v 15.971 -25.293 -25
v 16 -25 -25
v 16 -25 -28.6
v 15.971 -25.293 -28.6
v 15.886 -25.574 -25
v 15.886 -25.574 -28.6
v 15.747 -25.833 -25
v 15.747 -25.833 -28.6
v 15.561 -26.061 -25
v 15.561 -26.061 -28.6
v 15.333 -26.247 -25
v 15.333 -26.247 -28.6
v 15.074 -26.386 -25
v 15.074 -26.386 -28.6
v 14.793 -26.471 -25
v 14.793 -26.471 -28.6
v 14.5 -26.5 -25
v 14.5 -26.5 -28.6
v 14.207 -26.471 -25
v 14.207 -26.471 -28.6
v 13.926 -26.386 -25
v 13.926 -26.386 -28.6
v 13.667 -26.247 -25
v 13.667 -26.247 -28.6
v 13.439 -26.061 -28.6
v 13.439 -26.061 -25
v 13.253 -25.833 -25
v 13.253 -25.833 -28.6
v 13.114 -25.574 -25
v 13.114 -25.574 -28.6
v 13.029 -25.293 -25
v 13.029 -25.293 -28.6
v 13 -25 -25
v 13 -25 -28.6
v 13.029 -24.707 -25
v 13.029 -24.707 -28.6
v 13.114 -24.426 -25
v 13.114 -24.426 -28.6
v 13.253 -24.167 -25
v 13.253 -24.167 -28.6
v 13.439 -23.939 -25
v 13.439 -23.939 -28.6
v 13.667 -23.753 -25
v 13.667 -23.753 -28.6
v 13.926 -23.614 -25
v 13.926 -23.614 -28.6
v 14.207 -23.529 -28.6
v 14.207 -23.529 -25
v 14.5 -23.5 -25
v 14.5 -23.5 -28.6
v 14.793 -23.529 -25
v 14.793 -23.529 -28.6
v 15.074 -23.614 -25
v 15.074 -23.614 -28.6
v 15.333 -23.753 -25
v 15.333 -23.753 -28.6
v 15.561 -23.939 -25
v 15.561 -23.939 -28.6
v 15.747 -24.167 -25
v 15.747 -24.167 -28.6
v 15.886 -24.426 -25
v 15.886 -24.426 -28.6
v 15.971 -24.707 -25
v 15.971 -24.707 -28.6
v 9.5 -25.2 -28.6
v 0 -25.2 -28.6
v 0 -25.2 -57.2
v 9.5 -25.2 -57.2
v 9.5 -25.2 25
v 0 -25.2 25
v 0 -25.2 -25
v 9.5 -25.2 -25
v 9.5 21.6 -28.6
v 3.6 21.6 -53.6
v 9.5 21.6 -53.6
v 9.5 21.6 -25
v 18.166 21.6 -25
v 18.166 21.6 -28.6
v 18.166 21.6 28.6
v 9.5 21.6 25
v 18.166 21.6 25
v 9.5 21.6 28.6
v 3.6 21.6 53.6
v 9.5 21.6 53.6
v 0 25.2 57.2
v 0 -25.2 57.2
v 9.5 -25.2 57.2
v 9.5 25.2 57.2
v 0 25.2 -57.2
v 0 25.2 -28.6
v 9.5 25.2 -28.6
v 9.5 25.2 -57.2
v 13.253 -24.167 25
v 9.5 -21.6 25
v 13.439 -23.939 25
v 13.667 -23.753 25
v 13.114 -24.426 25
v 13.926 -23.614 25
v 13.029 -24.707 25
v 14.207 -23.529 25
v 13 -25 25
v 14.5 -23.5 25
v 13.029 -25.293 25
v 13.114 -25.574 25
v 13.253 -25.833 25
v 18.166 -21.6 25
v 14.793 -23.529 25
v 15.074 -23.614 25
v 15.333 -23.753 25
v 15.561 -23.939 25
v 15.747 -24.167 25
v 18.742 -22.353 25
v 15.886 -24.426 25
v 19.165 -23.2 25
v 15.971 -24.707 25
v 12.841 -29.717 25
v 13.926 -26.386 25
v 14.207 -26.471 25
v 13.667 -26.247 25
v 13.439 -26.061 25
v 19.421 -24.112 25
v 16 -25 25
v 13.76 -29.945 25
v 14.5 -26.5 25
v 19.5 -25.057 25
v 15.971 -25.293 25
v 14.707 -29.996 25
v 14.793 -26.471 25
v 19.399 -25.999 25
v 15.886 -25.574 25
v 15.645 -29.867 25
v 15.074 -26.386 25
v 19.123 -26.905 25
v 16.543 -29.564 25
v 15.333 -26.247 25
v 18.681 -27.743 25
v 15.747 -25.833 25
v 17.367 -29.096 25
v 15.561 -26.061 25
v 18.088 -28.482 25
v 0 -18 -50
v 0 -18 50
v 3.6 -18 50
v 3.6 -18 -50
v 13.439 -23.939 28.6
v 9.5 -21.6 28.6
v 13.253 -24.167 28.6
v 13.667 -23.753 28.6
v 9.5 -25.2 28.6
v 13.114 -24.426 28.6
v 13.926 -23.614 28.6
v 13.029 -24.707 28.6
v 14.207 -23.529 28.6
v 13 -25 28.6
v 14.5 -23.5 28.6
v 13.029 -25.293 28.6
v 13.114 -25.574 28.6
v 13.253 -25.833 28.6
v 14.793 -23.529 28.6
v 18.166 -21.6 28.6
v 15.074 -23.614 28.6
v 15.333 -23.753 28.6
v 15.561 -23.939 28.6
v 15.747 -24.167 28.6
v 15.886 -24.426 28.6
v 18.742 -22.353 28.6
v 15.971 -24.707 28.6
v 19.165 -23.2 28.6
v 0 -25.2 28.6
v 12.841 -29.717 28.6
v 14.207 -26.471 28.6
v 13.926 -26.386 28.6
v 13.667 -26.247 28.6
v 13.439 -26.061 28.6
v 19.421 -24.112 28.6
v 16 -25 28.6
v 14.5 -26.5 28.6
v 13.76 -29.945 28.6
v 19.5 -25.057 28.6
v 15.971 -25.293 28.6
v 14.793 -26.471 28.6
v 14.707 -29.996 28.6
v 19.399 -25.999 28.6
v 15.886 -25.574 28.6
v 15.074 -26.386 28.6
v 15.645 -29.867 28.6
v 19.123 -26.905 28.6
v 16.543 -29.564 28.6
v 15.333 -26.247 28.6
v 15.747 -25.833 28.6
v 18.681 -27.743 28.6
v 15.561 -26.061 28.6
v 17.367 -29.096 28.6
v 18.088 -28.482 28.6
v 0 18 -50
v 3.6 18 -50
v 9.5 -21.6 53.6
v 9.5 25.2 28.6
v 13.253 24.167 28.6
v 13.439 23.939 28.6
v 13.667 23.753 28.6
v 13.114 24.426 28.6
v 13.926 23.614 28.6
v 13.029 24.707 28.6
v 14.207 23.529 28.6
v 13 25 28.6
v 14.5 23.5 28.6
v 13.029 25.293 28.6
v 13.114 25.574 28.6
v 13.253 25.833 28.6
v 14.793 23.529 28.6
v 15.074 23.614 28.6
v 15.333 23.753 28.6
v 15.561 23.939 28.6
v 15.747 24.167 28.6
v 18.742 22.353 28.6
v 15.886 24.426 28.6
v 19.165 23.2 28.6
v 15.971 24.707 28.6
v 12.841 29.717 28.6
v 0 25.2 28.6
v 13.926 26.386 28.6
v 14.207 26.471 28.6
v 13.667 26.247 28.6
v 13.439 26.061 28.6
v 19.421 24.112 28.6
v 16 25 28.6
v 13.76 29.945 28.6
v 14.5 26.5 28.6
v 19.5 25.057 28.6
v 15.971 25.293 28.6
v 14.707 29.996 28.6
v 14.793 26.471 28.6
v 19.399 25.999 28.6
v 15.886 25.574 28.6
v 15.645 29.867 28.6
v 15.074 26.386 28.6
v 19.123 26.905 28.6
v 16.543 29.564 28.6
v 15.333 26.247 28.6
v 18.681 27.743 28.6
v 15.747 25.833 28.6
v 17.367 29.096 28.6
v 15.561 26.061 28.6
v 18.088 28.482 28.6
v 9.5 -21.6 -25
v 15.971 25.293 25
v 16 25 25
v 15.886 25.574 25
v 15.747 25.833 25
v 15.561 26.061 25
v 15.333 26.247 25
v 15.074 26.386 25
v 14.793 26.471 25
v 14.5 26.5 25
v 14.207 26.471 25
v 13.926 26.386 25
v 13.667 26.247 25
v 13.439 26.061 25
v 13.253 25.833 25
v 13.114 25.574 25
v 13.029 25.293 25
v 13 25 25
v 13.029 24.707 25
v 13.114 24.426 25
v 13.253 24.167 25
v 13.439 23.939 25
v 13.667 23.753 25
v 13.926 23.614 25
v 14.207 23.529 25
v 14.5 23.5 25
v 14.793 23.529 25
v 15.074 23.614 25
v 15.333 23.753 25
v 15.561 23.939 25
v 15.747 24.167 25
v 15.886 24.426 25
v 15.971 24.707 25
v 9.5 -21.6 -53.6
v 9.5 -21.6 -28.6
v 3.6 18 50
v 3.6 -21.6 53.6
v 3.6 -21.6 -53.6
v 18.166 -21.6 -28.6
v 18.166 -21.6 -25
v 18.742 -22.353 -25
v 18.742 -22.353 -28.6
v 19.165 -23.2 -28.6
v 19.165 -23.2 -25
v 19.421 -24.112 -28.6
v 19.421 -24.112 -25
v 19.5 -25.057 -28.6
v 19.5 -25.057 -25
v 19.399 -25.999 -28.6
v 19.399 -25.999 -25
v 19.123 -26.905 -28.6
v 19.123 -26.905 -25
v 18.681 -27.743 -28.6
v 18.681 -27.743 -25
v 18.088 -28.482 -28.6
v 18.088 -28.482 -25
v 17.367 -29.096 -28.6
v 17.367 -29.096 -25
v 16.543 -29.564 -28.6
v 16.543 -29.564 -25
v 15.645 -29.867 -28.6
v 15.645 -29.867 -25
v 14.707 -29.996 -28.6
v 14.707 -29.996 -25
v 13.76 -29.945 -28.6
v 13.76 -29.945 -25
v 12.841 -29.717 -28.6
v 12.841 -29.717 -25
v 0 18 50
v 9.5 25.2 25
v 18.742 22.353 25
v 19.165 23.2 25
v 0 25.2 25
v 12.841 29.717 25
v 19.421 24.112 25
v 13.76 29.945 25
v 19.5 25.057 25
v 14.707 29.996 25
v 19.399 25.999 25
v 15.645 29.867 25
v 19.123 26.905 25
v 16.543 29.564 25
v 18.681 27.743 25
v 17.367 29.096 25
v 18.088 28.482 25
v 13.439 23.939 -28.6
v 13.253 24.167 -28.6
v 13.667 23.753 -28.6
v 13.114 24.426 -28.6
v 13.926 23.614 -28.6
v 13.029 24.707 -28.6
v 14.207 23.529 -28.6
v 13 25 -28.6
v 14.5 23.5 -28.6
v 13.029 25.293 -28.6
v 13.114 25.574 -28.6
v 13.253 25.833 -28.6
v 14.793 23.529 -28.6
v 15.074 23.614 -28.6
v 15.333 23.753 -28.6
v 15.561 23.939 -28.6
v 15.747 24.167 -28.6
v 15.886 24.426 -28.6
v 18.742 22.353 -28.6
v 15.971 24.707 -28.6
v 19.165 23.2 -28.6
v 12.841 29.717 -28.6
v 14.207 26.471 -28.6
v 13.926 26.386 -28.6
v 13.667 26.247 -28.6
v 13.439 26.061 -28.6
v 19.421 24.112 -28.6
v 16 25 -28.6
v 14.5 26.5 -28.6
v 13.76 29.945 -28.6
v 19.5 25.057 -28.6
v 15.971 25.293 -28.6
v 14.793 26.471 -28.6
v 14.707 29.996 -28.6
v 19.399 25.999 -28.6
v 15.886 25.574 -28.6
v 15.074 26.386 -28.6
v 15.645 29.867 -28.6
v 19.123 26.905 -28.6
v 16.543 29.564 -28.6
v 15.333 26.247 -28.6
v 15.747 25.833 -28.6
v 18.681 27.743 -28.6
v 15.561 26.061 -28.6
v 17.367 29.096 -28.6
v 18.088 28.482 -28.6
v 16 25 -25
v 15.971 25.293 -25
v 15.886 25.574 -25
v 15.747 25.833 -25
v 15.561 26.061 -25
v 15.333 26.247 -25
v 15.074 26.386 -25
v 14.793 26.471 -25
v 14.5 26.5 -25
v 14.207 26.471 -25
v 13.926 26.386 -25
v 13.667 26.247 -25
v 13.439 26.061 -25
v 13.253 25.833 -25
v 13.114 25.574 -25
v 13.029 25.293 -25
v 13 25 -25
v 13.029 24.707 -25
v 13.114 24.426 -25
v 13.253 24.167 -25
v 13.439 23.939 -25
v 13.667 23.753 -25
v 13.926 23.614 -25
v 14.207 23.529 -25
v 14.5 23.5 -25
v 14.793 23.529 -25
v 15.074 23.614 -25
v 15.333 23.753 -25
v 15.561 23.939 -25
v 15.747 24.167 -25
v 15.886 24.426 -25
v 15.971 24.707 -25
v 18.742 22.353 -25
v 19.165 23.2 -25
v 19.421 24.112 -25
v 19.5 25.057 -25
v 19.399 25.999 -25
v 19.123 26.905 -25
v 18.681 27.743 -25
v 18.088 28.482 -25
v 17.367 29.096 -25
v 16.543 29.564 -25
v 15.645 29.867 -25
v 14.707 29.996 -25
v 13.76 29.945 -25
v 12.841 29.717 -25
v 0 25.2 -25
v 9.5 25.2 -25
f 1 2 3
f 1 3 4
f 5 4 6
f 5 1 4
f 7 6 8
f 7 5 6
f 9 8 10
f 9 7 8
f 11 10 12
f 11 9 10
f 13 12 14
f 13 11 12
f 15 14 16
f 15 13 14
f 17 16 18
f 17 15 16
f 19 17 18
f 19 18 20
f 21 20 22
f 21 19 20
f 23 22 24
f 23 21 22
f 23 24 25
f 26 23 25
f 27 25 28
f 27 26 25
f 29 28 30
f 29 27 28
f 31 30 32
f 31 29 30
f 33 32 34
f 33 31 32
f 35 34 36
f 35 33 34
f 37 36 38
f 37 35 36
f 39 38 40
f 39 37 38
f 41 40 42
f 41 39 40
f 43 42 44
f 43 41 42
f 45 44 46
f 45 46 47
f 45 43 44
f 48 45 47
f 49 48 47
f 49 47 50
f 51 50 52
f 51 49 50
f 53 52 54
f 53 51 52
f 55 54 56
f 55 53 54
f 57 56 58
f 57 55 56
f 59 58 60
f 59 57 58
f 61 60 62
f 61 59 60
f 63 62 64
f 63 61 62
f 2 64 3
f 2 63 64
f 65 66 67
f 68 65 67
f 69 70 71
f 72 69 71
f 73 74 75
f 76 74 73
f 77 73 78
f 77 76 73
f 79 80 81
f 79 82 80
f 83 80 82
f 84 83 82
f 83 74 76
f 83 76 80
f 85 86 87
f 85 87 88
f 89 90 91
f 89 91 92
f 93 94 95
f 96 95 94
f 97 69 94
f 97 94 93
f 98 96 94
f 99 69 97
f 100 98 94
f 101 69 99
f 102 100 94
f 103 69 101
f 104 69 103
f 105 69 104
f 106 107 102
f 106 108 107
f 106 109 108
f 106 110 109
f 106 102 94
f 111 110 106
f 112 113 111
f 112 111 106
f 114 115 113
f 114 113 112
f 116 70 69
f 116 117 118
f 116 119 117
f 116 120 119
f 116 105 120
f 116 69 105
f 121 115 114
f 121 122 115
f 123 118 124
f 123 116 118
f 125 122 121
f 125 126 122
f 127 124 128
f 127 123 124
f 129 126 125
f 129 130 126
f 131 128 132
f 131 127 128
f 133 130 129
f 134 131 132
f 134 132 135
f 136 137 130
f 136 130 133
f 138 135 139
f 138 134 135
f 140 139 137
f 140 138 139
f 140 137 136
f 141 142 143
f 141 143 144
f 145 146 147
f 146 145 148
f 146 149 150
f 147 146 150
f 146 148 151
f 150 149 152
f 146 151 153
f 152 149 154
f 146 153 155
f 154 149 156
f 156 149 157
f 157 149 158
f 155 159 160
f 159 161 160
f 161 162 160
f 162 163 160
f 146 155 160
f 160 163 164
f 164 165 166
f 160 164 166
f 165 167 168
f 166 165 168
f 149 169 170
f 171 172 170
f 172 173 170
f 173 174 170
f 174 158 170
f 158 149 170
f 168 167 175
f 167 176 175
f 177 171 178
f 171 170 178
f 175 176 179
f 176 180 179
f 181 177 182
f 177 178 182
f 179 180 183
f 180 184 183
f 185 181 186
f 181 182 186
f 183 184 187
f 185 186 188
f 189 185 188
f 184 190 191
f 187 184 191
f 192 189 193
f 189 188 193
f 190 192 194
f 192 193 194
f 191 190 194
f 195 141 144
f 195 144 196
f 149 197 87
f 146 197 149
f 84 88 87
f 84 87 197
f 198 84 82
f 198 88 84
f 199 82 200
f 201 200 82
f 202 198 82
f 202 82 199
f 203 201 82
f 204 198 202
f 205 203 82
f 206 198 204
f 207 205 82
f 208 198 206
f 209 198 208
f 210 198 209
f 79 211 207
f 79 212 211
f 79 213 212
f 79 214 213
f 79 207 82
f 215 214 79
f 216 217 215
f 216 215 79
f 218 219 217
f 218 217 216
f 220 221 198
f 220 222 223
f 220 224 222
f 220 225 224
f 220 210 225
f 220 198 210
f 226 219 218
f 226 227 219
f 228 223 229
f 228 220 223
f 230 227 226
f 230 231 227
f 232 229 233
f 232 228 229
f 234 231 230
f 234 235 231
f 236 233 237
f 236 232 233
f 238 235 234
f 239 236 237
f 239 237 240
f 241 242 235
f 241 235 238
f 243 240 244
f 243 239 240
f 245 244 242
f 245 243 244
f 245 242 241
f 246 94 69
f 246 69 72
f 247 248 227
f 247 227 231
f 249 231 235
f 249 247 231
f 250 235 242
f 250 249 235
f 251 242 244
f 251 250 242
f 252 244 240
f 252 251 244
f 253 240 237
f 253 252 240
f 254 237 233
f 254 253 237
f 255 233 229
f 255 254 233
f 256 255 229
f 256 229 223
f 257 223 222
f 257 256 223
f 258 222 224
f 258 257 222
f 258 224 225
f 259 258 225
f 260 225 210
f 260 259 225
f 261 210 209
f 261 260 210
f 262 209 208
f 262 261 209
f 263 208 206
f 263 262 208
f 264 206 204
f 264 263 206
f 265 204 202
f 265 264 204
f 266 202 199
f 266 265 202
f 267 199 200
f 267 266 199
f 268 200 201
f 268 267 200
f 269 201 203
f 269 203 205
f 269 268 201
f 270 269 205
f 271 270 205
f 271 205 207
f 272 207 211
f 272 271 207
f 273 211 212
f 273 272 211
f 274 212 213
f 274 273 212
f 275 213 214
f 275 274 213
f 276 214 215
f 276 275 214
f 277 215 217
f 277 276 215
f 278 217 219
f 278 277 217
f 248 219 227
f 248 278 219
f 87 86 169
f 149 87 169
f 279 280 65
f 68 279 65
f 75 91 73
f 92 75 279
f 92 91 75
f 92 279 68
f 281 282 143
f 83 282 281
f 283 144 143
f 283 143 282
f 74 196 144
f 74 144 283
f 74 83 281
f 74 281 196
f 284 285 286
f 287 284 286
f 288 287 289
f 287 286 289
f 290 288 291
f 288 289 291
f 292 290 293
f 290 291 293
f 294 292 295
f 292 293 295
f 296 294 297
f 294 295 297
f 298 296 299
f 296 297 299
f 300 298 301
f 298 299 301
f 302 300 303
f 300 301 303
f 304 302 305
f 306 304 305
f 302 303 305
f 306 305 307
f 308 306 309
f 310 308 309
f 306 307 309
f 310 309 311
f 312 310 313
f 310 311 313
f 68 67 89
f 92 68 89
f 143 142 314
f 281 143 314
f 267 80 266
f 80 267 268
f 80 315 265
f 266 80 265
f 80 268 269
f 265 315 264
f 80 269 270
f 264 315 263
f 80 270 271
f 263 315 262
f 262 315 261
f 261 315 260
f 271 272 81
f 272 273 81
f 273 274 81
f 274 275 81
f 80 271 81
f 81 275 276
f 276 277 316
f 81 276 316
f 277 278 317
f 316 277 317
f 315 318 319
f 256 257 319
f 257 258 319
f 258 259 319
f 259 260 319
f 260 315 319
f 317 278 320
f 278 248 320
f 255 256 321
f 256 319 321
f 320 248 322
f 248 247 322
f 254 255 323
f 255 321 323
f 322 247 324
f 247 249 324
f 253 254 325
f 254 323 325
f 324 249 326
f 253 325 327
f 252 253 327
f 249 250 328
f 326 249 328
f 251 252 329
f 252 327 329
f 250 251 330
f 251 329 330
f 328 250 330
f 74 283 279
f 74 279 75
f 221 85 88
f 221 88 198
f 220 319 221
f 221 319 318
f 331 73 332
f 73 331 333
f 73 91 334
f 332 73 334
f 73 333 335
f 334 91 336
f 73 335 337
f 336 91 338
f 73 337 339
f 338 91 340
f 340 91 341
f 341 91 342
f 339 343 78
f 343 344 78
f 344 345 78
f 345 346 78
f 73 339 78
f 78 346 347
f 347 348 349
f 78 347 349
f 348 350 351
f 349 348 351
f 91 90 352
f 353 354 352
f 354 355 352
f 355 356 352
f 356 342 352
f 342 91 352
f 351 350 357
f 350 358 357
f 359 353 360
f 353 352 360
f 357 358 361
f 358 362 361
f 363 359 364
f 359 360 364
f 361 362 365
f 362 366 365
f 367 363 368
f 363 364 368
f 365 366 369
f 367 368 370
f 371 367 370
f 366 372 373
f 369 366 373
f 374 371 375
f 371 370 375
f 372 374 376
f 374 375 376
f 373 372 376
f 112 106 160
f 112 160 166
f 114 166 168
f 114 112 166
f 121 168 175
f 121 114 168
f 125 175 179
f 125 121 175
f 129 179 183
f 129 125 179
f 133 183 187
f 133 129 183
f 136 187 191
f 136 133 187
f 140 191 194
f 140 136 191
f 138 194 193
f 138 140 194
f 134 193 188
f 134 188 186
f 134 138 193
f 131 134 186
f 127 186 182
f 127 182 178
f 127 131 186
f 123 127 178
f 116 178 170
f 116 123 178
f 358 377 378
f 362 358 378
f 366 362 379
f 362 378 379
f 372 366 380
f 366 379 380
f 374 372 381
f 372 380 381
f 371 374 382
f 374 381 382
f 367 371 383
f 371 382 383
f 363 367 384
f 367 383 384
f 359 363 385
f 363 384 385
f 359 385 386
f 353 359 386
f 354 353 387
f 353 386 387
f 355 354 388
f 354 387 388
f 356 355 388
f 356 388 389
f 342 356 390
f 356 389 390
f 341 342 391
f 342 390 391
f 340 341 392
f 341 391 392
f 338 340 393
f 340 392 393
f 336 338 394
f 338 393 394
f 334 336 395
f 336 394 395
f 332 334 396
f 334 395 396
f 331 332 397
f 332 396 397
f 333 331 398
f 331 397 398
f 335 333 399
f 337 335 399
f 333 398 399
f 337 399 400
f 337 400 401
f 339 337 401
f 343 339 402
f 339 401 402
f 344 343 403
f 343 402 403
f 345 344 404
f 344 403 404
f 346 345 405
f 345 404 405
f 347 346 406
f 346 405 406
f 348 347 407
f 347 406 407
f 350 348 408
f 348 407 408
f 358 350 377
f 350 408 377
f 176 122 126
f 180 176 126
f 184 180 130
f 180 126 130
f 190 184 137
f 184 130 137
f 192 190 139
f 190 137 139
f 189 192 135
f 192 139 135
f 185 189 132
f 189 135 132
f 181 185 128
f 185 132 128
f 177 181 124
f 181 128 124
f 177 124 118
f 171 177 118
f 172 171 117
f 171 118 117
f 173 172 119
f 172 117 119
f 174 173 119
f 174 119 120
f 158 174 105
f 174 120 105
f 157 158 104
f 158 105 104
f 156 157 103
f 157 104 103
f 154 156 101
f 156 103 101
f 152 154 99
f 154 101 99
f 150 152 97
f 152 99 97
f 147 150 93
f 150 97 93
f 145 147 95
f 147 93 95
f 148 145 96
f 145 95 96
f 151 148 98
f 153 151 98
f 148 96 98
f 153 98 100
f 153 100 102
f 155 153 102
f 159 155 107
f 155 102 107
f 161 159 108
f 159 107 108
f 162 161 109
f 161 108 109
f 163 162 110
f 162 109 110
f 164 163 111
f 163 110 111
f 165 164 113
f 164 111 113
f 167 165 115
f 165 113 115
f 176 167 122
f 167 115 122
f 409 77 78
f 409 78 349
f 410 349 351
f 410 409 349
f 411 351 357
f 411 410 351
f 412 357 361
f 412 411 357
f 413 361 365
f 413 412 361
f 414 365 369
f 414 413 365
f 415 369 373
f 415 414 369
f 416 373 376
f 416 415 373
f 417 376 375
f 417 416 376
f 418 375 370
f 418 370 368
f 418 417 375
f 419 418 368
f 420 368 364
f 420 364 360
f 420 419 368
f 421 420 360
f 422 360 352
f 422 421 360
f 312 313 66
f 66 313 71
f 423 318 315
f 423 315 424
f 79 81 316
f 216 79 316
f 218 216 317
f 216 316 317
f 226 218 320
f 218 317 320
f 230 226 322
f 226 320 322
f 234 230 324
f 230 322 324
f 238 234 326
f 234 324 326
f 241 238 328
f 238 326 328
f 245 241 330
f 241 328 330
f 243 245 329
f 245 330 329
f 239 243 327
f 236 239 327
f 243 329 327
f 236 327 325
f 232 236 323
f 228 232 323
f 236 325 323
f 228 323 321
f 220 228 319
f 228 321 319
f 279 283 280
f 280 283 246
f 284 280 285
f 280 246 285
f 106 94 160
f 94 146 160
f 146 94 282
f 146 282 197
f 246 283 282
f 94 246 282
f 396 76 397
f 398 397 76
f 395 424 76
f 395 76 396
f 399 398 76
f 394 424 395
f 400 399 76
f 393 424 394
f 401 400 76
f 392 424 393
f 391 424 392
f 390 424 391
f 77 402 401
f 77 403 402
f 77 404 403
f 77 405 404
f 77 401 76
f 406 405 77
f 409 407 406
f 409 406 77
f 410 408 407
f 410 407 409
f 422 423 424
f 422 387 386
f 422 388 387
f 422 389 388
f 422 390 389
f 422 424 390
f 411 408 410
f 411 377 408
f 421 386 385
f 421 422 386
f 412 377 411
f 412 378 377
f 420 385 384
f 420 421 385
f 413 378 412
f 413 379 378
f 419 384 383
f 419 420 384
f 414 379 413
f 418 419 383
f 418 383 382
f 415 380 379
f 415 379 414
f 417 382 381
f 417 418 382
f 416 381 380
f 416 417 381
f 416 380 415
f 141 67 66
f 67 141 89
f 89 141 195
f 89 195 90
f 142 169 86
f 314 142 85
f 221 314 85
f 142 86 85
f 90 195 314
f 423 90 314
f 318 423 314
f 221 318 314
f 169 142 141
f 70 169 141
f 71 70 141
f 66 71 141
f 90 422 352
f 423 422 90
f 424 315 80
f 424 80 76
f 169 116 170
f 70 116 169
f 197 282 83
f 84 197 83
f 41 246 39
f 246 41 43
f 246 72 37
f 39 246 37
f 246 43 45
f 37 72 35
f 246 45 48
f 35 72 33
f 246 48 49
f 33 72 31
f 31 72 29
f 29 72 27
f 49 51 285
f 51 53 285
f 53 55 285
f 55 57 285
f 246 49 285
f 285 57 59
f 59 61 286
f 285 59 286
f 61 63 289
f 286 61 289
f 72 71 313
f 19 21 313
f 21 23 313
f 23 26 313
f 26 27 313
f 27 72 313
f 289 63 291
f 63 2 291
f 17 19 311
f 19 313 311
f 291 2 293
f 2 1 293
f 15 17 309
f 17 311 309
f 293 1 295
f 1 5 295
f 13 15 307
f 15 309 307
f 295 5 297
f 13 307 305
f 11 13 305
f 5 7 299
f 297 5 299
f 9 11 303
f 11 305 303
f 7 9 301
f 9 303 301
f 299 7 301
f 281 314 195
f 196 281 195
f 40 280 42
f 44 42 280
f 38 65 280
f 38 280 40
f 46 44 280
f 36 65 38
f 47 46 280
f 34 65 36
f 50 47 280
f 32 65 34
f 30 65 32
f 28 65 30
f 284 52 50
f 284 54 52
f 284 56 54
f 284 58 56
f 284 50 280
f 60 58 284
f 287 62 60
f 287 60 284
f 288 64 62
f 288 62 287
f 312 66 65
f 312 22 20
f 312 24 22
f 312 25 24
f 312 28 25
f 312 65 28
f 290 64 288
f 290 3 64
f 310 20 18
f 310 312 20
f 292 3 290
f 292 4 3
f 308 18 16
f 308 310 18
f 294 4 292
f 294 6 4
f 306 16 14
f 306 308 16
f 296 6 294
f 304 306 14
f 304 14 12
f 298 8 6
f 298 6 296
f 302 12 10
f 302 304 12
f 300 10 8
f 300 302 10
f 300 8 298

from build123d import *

# Parameters (mm, degrees)
SKETCH_1_W               = 114.4
SKETCH_1_H               = 50.4
SKETCH_1_W_2             = 100
SKETCH_1_H_2             = 36
EXTRUDE_1_DEPTH          = 3.6
SKETCH_1_3_W             = 114.4
SKETCH_1_3_H             = 50.4
SKETCH_1_3_W_2           = 107.2
SKETCH_1_3_H_2           = 43.2
EXTRUDE_2_DEPTH          = 9.5
EXTRUDE_START            = 25
SKETCH_2_R               = 1.5
EXTRUDE_3_DEPTH          = 3.6
MIRROR_START             = 25
MIRROR_2_COPY_1_SKETCH_R = 1.5
MIRROR_2_COPY_1_DEPTH    = 3.6


with BuildPart() as part:
    # 草图1 → 凸台-拉伸1 (new body)
    with BuildSketch(Plane(origin=(0, 0, 0), x_dir=(0, 0, -1), z_dir=(1, 0, 0))):
        Rectangle(SKETCH_1_W, SKETCH_1_H)
        Rectangle(SKETCH_1_W_2, SKETCH_1_H_2, mode=Mode.SUBTRACT)
    extrude(amount=EXTRUDE_1_DEPTH)

    # 草图1<3> → 凸台-拉伸2 (add)
    with BuildSketch(Plane(origin=(0, 0, 0), x_dir=(0, 0, -1), z_dir=(1, 0, 0))):
        Rectangle(SKETCH_1_3_W, SKETCH_1_3_H)
        Rectangle(SKETCH_1_3_W_2, SKETCH_1_3_H_2, mode=Mode.SUBTRACT)
    extrude(amount=EXTRUDE_2_DEPTH)

    # 草图2 → 凸台-拉伸3 (add)
    with BuildSketch(Plane.XY.offset(EXTRUDE_START)):
        with BuildLine():
            Line((12.840920286, 29.716720736), (0, 25.2))
            Line((0, 25.2), (0, 21.6))
            Line((0, 21.6), (9.5, 21.6))
            Line((9.5, 21.6), (18.166060556, 21.6))
            ThreePointArc((18.166060556, 21.6), (18.680583919, 27.74275739), (12.840920286, 29.716720736))
        make_face()
        with Locations((14.5, 25)):
            Circle(SKETCH_2_R, mode=Mode.SUBTRACT)
    extrude_3 = extrude(amount=EXTRUDE_3_DEPTH)

    # 镜向1: 凸台-拉伸3 across plane
    add(extrude_3.mirror(Plane.XY))

    # 镜向2: 凸台-拉伸3 across plane
    add(extrude_3.mirror(Plane.ZX))

    # 镜向2 copy 1 sketch → 镜向2 copy 1 (add)
    with BuildSketch(Plane(origin=(0, 0, 0), x_dir=(1, 0, 0), z_dir=(0, 0, -1)).offset(MIRROR_START)):
        with BuildLine():
            Line((12.840920286, 29.716720736), (0, 25.2))
            Line((0, 25.2), (0, 21.6))
            Line((0, 21.6), (9.5, 21.6))
            Line((9.5, 21.6), (18.166060556, 21.6))
            ThreePointArc((18.166060556, 21.6), (18.680583919, 27.74275739), (12.840920286, 29.716720736))
        make_face()
        with Locations((14.5, 25)):
            Circle(MIRROR_2_COPY_1_SKETCH_R, mode=Mode.SUBTRACT)
    extrude(amount=MIRROR_2_COPY_1_DEPTH)


solid = part.part
